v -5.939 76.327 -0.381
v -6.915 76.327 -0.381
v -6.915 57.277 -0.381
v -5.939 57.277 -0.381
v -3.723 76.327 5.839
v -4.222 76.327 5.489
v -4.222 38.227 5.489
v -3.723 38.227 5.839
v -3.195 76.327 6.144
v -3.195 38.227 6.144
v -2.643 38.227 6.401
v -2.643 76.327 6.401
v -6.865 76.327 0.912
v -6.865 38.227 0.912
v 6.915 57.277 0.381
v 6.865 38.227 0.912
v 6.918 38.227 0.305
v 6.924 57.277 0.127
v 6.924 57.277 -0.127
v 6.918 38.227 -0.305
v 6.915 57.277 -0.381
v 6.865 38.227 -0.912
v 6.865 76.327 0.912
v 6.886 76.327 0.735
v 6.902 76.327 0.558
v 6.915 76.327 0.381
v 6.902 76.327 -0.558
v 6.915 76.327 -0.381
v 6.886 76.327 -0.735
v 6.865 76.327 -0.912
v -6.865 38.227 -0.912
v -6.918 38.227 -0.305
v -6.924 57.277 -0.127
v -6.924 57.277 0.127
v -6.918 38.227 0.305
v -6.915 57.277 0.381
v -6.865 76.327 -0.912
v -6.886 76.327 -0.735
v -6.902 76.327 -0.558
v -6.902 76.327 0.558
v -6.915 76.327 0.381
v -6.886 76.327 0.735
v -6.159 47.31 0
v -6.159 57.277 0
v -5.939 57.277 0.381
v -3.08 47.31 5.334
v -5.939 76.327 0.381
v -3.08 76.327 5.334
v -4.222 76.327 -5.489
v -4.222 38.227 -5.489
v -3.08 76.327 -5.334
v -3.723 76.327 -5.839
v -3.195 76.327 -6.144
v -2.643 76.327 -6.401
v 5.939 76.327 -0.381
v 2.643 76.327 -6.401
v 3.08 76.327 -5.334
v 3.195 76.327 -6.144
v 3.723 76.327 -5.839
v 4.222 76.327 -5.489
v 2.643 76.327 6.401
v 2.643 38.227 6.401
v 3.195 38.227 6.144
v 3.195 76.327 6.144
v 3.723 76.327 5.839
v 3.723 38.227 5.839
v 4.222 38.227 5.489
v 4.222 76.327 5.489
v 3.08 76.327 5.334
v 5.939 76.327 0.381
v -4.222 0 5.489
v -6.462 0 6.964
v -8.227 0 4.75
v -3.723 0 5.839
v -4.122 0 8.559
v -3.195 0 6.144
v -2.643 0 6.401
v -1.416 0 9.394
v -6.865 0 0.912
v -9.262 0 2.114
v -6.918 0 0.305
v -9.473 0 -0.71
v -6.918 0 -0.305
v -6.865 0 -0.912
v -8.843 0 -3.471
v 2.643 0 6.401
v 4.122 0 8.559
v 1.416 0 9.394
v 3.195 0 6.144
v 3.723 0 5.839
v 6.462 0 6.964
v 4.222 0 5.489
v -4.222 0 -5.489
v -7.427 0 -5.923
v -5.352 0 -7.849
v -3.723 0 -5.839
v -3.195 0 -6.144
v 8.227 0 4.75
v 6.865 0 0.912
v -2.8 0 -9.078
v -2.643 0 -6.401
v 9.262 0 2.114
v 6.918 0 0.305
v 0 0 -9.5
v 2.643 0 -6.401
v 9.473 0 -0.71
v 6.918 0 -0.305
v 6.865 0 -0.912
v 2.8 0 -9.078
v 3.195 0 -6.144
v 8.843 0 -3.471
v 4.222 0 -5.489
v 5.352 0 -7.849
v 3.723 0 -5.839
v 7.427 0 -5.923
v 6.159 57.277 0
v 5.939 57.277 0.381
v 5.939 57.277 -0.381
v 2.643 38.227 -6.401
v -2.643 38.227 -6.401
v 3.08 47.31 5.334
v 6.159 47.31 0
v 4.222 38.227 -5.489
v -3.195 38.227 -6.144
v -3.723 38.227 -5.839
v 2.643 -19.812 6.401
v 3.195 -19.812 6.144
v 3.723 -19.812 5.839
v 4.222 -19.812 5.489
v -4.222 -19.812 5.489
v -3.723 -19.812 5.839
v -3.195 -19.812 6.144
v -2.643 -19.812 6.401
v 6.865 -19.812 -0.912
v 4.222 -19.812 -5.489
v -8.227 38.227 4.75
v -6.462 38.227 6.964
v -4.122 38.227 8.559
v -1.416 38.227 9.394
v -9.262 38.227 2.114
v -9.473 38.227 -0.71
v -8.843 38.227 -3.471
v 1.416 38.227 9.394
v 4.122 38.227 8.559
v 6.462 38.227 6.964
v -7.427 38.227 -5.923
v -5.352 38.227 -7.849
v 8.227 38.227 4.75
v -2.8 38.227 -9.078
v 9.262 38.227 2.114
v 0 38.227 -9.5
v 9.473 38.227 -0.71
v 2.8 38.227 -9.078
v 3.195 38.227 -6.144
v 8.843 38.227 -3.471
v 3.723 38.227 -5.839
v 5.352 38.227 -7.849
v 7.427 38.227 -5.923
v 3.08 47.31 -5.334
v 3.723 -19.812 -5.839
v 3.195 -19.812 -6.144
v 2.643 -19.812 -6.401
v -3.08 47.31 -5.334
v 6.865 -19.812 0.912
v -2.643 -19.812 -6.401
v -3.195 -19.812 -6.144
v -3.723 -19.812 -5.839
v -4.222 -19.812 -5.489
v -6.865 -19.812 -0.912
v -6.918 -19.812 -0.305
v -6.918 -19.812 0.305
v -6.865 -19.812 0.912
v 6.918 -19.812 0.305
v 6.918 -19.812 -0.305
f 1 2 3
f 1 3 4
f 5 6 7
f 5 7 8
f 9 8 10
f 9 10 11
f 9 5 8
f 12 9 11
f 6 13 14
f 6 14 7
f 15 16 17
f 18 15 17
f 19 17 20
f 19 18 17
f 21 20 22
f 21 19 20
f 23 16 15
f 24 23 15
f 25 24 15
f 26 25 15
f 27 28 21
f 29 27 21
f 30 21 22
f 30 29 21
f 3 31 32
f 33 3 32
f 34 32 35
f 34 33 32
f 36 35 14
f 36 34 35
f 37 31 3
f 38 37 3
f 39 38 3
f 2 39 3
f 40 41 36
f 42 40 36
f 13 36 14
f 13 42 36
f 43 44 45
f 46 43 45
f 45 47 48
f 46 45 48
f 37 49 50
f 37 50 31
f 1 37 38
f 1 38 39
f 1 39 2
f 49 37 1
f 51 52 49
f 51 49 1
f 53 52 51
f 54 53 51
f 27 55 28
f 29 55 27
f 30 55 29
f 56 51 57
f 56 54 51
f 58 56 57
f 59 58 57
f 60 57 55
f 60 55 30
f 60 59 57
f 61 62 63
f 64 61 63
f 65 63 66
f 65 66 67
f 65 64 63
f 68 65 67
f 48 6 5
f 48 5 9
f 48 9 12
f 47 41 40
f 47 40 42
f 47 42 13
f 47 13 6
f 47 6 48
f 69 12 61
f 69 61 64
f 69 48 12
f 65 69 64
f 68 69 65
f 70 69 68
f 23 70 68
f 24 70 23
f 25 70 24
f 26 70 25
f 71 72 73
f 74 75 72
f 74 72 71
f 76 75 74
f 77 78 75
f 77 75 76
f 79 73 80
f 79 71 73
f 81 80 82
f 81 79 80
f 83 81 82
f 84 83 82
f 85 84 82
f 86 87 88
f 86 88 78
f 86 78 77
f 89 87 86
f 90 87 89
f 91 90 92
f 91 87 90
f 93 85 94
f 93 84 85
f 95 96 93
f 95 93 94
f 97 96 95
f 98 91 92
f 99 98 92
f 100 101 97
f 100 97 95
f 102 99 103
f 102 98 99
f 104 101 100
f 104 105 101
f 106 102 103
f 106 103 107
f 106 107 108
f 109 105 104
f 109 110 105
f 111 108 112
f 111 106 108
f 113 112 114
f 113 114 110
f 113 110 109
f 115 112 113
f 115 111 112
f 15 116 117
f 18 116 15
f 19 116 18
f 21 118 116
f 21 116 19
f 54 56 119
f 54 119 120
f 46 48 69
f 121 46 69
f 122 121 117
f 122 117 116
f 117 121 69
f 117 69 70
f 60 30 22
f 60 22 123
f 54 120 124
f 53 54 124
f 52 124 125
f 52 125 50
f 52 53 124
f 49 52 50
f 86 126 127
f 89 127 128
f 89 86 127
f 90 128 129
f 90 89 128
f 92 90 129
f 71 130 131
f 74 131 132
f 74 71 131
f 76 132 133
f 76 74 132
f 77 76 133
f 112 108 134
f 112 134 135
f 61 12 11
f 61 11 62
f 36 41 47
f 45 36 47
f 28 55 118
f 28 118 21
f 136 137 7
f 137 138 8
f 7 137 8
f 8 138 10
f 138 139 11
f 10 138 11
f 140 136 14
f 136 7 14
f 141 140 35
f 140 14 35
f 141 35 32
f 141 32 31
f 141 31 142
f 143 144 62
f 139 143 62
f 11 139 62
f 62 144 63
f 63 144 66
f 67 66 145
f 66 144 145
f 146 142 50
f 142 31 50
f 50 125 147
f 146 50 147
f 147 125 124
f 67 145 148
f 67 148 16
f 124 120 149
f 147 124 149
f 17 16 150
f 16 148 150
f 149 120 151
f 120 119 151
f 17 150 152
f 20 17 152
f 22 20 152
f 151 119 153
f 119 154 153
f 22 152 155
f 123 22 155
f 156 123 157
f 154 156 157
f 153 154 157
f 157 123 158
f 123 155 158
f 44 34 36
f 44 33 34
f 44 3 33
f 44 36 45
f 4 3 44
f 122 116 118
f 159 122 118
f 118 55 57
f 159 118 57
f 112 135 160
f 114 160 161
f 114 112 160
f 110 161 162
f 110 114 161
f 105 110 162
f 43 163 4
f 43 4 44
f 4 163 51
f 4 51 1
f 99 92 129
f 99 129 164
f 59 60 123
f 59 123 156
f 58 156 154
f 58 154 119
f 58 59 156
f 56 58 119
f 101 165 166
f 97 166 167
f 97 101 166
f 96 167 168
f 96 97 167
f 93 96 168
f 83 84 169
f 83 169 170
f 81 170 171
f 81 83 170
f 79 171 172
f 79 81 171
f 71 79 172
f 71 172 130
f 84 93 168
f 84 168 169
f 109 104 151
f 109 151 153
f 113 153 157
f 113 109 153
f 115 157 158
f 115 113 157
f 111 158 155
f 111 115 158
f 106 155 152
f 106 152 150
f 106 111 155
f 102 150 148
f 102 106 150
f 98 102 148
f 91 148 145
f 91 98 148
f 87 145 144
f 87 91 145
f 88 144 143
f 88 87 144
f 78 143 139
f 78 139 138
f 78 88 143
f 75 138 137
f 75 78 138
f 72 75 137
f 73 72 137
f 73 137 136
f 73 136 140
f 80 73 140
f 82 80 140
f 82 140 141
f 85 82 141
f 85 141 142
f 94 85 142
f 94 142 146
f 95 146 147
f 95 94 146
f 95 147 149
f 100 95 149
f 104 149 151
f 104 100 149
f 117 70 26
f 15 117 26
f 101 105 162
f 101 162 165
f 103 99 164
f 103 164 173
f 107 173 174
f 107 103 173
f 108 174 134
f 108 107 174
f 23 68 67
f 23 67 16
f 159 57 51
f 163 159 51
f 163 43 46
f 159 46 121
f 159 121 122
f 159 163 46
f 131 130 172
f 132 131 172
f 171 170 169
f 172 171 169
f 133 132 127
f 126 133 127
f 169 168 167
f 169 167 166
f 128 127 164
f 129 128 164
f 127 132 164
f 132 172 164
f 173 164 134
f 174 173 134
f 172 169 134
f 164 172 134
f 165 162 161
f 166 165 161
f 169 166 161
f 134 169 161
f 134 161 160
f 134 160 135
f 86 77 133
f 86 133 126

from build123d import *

# Parameters (mm, degrees)
BOSS_EXTRUDE1_DEPTH = 19.812
SKETCH2_R           = 9.5
BOSS_EXTRUDE2_DEPTH = 38.227
BOSS_EXTRUDE6_START = 76.327
BOSS_EXTRUDE6_DEPTH = 76.327
SKETCH6_W           = 13.85
SKETCH6_H           = 0.762
CUT_EXTRUDE1_DEPTH  = 19.05
CUT_EXTRUDE2_DEPTH  = 29.016999878


with BuildPart() as part:
    # Sketch1 → Boss-Extrude1 (new body)
    with BuildSketch(Plane(origin=(0, 0, 0), x_dir=(1, 0, 0), z_dir=(0, 1, 0))):
        with BuildLine():
            Line((6.86474929, 0.911505448), (4.221761519, 5.489294552))
            ThreePointArc((4.221761519, 5.489294552), (3.4625, 5.997225921), (2.642987771, 6.4008))
            Line((2.642987771, 6.4008), (-2.642987771, 6.4008))
            ThreePointArc((-2.642987771, 6.4008), (-3.4625, 5.997225921), (-4.221761519, 5.489294552))
            Line((-4.221761519, 5.489294552), (-6.86474929, 0.911505448))
            ThreePointArc((-6.86474929, 0.911505448), (-6.925, 0), (-6.86474929, -0.911505448))
            Line((-6.86474929, -0.911505448), (-4.221761519, -5.489294552))
            ThreePointArc((-4.221761519, -5.489294552), (-3.4625, -5.997225921), (-2.642987771, -6.4008))
            Line((-2.642987771, -6.4008), (2.642987771, -6.4008))
            ThreePointArc((2.642987771, -6.4008), (3.4625, -5.997225921), (4.221761519, -5.489294552))
            Line((4.221761519, -5.489294552), (6.86474929, -0.911505448))
            ThreePointArc((6.86474929, -0.911505448), (6.925, 0), (6.86474929, 0.911505448))
        make_face()
    extrude(amount=-BOSS_EXTRUDE1_DEPTH)

    # Sketch2 → Boss-Extrude2 (add)
    with BuildSketch(Plane(origin=(0, 0, 0), x_dir=(-1, 0, 0), z_dir=(0, -1, 0))):
        Circle(SKETCH2_R)
    extrude(amount=-BOSS_EXTRUDE2_DEPTH)

    # Sketch1<4> → Boss-Extrude6 (add)
    with BuildSketch(Plane(origin=(0, 0, 0), x_dir=(1, 0, 0), z_dir=(0, 1, 0)).offset(BOSS_EXTRUDE6_START)):
        with BuildLine():
            Line((6.86474929, 0.911505448), (4.221761519, 5.489294552))
            ThreePointArc((4.221761519, 5.489294552), (3.4625, 5.997225921), (2.642987771, 6.4008))
            Line((2.642987771, 6.4008), (-2.642987771, 6.4008))
            ThreePointArc((-2.642987771, 6.4008), (-3.4625, 5.997225921), (-4.221761519, 5.489294552))
            Line((-4.221761519, 5.489294552), (-6.86474929, 0.911505448))
            ThreePointArc((-6.86474929, 0.911505448), (-6.925, 0), (-6.86474929, -0.911505448))
            Line((-6.86474929, -0.911505448), (-4.221761519, -5.489294552))
            ThreePointArc((-4.221761519, -5.489294552), (-3.4625, -5.997225921), (-2.642987771, -6.4008))
            Line((-2.642987771, -6.4008), (2.642987771, -6.4008))
            ThreePointArc((2.642987771, -6.4008), (3.4625, -5.997225921), (4.221761519, -5.489294552))
            Line((4.221761519, -5.489294552), (6.86474929, -0.911505448))
            ThreePointArc((6.86474929, -0.911505448), (6.925, 0), (6.86474929, 0.911505448))
        make_face()
    extrude(amount=-BOSS_EXTRUDE6_DEPTH)

    # Sketch6 → Cut-Extrude1 (cut)
    with BuildSketch(Plane(origin=(0, 76.327, 0), x_dir=(1, 0, 0), z_dir=(0, 1, 0))):
        Rectangle(SKETCH6_W, SKETCH6_H)
    extrude(amount=-CUT_EXTRUDE1_DEPTH, mode=Mode.SUBTRACT)

    # Sketch7 → Cut-Extrude2 (cut)
    with BuildSketch(Plane(origin=(0, 76.327, 0), x_dir=(1, 0, 0), z_dir=(0, 1, 0))):
        Polygon((3.079586336, 5.334), (-3.079586336, 5.334), (-6.159172672, 0), (-3.079586336, -5.334), (3.079586336, -5.334), (6.159172672, 0), align=None)
    extrude(amount=-CUT_EXTRUDE2_DEPTH, mode=Mode.SUBTRACT)


solid = part.part
